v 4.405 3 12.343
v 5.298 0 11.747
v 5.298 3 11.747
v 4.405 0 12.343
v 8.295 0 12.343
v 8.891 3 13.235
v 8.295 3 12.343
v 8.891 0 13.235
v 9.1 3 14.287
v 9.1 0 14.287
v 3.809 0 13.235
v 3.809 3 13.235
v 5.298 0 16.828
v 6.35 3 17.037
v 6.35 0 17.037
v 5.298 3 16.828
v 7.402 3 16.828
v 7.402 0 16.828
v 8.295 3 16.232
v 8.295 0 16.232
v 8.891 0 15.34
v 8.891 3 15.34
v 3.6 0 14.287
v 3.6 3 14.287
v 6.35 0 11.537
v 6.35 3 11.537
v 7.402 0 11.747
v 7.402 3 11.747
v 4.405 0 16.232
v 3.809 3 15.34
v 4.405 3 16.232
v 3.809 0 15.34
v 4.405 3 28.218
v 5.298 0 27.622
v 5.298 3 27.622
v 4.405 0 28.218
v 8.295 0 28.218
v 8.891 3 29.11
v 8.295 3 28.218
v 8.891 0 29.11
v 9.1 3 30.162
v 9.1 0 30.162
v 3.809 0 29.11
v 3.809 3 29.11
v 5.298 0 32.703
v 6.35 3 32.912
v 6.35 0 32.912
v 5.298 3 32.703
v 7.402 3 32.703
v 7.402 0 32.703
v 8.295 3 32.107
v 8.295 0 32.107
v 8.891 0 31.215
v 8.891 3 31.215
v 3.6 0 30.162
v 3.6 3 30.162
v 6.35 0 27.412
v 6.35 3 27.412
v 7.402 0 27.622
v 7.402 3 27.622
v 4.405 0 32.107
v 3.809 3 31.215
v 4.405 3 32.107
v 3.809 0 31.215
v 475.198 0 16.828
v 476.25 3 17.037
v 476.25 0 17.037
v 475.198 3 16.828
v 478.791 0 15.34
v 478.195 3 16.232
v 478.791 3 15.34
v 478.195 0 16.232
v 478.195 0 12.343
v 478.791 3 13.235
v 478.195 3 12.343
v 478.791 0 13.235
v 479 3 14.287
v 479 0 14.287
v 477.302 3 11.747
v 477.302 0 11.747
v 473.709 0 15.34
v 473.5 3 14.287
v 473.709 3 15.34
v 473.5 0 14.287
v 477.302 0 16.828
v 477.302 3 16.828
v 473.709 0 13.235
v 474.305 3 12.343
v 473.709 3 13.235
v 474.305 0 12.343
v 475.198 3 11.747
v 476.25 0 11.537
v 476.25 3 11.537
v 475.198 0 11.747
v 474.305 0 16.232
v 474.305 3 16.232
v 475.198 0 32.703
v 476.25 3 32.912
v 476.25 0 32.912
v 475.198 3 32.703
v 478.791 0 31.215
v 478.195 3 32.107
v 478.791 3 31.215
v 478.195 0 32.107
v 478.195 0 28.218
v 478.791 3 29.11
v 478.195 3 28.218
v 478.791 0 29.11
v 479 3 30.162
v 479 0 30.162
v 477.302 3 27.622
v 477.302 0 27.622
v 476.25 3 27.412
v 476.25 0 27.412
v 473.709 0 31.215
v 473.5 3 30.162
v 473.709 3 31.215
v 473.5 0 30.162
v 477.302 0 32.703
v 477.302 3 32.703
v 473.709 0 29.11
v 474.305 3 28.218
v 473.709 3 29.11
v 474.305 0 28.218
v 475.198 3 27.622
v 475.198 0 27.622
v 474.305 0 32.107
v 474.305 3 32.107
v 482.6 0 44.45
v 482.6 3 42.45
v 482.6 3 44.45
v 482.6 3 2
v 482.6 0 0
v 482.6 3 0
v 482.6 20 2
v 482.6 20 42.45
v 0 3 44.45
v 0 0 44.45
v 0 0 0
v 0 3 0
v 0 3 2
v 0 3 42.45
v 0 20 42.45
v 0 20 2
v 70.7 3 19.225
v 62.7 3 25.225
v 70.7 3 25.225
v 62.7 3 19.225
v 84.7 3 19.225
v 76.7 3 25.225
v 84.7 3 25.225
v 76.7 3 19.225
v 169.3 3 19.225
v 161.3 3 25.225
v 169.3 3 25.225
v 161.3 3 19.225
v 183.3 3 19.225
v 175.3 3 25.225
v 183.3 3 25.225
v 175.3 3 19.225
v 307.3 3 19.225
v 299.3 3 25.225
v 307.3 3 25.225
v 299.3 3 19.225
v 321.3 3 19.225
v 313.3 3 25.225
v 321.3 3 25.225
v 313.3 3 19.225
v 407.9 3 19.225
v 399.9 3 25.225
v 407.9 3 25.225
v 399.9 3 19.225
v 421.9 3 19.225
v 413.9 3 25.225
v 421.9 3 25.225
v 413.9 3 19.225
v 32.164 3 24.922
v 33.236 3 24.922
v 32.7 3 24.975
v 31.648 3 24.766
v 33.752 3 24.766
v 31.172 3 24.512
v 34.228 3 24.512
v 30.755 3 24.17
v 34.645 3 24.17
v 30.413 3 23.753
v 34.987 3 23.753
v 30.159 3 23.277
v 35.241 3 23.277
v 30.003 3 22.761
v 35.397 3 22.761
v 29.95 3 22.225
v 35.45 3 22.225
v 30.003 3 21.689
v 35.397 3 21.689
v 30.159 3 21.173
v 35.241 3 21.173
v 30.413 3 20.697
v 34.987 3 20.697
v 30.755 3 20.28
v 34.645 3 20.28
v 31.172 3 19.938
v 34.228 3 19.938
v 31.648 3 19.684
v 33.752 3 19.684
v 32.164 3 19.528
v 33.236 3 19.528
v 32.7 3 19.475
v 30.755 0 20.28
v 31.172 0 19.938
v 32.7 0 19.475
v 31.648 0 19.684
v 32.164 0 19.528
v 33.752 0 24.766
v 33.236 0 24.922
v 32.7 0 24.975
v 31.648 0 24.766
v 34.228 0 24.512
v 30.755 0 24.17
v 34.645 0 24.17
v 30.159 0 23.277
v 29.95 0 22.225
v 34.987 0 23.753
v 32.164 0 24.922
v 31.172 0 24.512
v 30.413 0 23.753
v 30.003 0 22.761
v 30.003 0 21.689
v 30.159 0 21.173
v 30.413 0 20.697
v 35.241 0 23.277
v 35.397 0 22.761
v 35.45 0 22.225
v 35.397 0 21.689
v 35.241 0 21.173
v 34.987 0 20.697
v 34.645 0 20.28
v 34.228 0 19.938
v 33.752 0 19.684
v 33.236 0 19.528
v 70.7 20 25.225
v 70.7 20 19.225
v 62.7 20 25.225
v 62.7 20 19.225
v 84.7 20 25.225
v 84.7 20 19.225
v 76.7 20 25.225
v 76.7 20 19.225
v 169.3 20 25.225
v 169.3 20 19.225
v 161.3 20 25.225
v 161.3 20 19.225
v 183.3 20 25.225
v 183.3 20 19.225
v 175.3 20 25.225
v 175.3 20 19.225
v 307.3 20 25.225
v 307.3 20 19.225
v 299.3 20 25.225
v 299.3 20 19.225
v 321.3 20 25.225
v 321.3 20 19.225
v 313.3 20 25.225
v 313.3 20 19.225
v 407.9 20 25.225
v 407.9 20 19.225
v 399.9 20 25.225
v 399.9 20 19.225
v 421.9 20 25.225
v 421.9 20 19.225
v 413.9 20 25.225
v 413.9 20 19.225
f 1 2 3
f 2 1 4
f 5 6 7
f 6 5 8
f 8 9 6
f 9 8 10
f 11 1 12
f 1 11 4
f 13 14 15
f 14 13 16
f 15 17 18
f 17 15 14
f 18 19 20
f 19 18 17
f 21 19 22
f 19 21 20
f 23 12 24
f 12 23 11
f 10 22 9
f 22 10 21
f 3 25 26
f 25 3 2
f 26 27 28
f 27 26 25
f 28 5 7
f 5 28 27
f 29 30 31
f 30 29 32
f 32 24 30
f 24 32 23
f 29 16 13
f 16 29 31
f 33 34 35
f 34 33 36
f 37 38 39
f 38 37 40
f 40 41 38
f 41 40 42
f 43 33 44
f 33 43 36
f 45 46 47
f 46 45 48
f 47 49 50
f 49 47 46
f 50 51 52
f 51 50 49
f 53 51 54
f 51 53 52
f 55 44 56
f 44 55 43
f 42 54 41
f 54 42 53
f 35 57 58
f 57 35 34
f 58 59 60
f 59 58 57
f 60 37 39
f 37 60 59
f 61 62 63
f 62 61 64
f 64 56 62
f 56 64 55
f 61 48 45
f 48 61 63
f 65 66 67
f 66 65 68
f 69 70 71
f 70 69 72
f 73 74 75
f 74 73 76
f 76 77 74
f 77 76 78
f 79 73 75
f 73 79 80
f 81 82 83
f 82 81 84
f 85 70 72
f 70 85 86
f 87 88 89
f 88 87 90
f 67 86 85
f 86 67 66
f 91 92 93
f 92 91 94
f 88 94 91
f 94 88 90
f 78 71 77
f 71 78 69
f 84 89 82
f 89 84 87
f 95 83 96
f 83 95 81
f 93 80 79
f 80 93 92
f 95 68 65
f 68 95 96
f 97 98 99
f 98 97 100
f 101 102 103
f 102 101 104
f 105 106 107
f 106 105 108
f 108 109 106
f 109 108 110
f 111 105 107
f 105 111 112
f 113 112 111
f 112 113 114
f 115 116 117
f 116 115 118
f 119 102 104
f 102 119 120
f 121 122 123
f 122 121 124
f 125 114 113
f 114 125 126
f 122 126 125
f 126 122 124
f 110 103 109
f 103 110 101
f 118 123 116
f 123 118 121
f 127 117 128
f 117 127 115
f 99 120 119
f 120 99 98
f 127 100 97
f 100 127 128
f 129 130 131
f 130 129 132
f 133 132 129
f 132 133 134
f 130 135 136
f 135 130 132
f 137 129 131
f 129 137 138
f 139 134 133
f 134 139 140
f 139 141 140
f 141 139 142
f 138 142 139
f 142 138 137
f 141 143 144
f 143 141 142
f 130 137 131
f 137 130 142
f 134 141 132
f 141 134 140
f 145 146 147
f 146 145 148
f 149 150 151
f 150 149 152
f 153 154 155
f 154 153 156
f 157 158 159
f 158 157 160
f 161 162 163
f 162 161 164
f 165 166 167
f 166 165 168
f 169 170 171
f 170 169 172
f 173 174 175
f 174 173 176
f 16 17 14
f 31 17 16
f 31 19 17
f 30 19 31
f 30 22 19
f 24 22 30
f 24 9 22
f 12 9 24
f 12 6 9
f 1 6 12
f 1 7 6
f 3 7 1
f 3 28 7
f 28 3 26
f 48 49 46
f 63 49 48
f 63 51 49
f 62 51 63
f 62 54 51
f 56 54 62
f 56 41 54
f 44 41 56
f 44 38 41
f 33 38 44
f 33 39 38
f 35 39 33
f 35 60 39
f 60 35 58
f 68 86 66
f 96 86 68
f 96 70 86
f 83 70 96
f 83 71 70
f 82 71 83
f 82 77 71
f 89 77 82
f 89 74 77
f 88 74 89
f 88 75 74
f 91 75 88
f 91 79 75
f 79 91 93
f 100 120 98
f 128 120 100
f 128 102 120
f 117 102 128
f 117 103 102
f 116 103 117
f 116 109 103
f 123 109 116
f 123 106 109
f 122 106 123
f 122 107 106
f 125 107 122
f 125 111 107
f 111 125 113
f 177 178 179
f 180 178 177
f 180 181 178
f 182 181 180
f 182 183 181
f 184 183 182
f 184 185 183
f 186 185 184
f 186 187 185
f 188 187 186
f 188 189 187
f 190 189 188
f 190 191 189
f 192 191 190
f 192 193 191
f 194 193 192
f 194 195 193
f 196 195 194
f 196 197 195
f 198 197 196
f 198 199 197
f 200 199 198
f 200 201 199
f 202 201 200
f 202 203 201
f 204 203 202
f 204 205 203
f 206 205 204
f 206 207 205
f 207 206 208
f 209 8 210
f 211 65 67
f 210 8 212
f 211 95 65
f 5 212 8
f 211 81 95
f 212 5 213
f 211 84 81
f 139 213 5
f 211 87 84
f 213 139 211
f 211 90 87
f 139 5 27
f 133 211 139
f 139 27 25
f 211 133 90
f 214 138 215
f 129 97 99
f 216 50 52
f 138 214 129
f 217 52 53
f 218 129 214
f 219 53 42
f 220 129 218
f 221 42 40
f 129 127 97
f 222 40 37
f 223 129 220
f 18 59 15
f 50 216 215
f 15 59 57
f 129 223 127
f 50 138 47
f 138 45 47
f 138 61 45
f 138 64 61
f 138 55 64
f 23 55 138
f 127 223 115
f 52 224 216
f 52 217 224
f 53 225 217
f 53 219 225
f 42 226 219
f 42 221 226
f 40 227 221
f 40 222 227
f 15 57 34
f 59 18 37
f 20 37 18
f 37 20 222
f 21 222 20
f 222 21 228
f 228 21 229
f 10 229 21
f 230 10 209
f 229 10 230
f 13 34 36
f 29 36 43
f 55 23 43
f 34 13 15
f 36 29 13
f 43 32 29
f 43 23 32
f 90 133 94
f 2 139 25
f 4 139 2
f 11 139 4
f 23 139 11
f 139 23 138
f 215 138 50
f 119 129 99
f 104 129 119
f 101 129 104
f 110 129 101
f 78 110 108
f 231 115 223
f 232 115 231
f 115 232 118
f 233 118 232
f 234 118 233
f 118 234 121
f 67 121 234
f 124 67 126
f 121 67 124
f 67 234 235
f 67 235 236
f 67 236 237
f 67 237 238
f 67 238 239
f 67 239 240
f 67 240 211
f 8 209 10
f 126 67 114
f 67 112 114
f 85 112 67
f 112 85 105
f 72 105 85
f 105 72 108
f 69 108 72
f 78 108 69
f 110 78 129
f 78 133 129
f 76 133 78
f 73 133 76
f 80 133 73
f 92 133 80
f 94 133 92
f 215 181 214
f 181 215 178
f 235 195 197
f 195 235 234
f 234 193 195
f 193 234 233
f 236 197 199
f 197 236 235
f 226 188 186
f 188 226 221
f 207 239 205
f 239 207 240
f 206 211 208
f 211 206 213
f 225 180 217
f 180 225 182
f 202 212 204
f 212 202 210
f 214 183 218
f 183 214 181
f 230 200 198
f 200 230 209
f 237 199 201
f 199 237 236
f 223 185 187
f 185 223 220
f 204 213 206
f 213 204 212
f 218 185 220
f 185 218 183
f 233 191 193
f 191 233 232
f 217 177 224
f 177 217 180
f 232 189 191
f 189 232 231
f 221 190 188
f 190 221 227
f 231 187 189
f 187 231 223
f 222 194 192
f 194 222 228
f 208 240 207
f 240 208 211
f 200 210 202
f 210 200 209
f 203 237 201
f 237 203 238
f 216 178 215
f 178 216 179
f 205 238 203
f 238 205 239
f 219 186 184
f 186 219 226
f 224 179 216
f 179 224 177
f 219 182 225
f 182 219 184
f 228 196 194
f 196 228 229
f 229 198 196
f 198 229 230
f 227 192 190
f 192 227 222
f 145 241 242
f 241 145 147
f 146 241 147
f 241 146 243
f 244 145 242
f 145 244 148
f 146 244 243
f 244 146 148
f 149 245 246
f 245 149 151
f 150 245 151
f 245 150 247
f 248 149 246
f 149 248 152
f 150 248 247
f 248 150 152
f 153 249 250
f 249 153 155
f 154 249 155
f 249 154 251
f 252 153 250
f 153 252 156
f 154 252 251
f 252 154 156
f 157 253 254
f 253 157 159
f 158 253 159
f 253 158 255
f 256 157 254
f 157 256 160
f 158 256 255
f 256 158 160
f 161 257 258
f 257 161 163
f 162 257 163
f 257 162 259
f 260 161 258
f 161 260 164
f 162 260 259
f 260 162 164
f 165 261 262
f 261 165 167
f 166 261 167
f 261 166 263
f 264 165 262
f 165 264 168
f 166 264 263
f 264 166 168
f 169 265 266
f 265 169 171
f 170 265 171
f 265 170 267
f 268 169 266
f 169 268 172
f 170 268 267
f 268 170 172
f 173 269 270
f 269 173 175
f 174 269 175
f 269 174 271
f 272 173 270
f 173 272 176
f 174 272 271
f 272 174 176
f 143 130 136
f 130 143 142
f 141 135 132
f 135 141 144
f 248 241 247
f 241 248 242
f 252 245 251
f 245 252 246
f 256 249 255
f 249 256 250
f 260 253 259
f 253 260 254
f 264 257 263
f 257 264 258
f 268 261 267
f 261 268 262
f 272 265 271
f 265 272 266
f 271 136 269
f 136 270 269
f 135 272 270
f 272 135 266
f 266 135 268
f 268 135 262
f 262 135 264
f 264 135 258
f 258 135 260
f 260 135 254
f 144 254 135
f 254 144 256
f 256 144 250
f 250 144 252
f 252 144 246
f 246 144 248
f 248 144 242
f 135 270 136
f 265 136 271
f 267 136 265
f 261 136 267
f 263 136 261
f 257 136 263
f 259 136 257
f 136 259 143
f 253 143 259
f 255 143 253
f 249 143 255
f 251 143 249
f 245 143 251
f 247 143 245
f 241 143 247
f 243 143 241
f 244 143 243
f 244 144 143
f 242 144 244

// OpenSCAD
// =============================================================================
// ISKANDER HEARTH — Tier 3 Federation Rack Panel v1
// File: tier3_federation_panel_v1.scad
// =============================================================================
// License : CERN Open Hardware Licence v2 – Strongly Reciprocal (CERN-OHL-S)
//           https://ohwr.org/cern_ohl_s_v2.txt
// Phase   : 8 — Distributed Cooperative Manufacturing
//
// WHAT THIS IS:
//   A 1U 19-inch blank rack panel for Tier 3 Federation deployments. Installed
//   in the rack unit immediately below or above the Supermicro server chassis.
//
//   Functions:
//   (1) Node identification — embossed serial, cooperative ID, and QR code
//       linking to this node's entry in the cooperative federation ledger.
//   (2) Cable management — horizontal cable routing slots (Velcro cable tie
//       points) for 10GbE, power, and IPMI cables.
//   (3) CERN-OHL-S compliance surface — open hardware declaration embossed
//       into the panel face, permanently attached to the physical hardware.
//   (4) Status indicator window — 1× 5mm LED hole for a panel-mount LED
//       driven by the HAT GPIO (HAT-optional for Tier 3; external USB GPIO).
//   (5) Air blanking — solid behind the identification zones prevents cold
//       aisle air bypass in ventilated racks.
//
// 19-INCH RACK PANEL SPECIFICATION (EIA-310-D):
//   External width  : 482.6mm (19-inch standard)
//   External height : 44.45mm (1U)
//   Panel thickness : 3.0mm (3D-printed) or 1.5–2mm (aluminium sheet)
//   Ear width       : 12.7mm (rack flange — includes mounting hole)
//   Mounting holes  : 6.35mm from ear edge, M5 or M6 clearance, spaced 15.875mm
//   Panel depth     : 20mm (slab panel — not a chassis, no rear clearance needed)
//
// PRINT SETTINGS:
//   Material : PETG or ASA (ASA preferred for server room humidity tolerance)
//   Layer    : 0.2mm
//   Perimeters: 4 (for rack ear rigidity)
//   Infill   : 40% gyroid
//   Orientation: Flat (panel lying on build surface)
//   Note: At 482.6mm width this exceeds most printer build volumes.
//         Print as TWO HALVES (see SECTION 5) joined with M3 hardware + alignment pins.
// =============================================================================


// =============================================================================
// SECTION 1 — PARAMETERS
// =============================================================================

// --- EIA-310-D 1U rack panel standard dimensions ---
rack_w          = 482.6;    // [mm] Standard 19-inch rack panel width
rack_u_h        = 44.45;    // [mm] 1U panel height
panel_t         = 3.0;      // [mm] Panel thickness (3D print: 3mm; laser Al: 1.5mm)
panel_depth     = 20.0;     // [mm] Panel body depth (slab — no interior components)

// --- Rack mounting ears ---
ear_w           = 12.7;     // [mm] Rack flange (ear) width each side
ear_hole_x      = 6.35;     // [mm] Mounting hole from ear edge (EIA-310)
ear_hole_d      = 5.5;      // [mm] M5 clearance hole (some racks use M6 — change to 6.5)
ear_hole_spacing = 15.875;  // [mm] Vertical spacing between rack mounting holes (EIA-310)
ear_hole_z_top  = rack_u_h / 2 - ear_hole_spacing / 2;
ear_hole_z_bot  = rack_u_h / 2 + ear_hole_spacing / 2;

// --- Usable panel interior (between the two ears) ---
panel_interior_w = rack_w - ear_w * 2;  // ≈ 457.2mm

// --- Cable management slots ---
// Horizontal slots for Velcro cable ties. Four positions across panel interior.
cable_slot_w    = 8;        // [mm] Slot width (Velcro tie passes through)
cable_slot_h    = 6;        // [mm] Slot height
cable_slot_t    = panel_depth - 4;  // [mm] Slot depth (through to near-rear face)
cable_slot_gap  = 60;       // [mm] Between slot pairs on left / right sides

// --- QR code surface ---
qr_size         = 30;       // [mm] QR sticker area
qr_border       = 2;        // [mm] Raised border
qr_recess_d     = 0.8;      // [mm] Sticker recess depth
qr_platform_sz  = qr_size + qr_border * 2;
qr_platform_h   = 2.0;      // [mm] Platform protrusion from front face

// --- Status LED hole ---
led_d           = 5.5;      // [mm] 5mm LED clearance hole
led_x           = ear_w + 20;           // [mm] 20mm from left ear
led_z           = rack_u_h / 2;         // [mm] Vertically centred

// --- Panel split (for printing in two halves) ---
split_x         = rack_w / 2;           // [mm] Split at centre
split_pin_d     = 3.0;                  // [mm] Alignment pin diameter (M3)
split_pin_h     = 8.0;                  // [mm] Alignment pin height
split_pin_spacing = 15;                 // [mm] Distance from split line to pin centres

// --- Fit tolerance ---
fit_t           = 0.4;      // [mm]


// =============================================================================
// SECTION 2 — HELPER MODULES
// =============================================================================

// Single cable management slot (through panel depth)
module cable_slot() {
    translate([0, -0.1, 0])
    cube([cable_slot_w, panel_depth + 0.2, cable_slot_h]);
}

// QR surface for panel — protrudes from front face (Y = panel_t direction)
// Panel front face is at Y = 0; this protrudes in -Y direction.
module qr_surface_panel() {
    difference() {
        cube([qr_platform_sz, qr_platform_h, qr_platform_sz]);
        // Recess on front face (Y = 0) of the platform
        translate([qr_border, -0.1, qr_border])
        cube([qr_size, qr_recess_d + 0.1, qr_size]);
    }
}


// =============================================================================
// SECTION 3 — MAIN PANEL MODULE
// =============================================================================

module federation_panel() {

    difference() {
        // ── Main panel body ──────────────────────────────────────────────────
        // Oriented: X = rack width, Y = panel thickness, Z = rack height
        cube([rack_w, panel_t, rack_u_h]);

        // ── Rack mounting holes in ears ──────────────────────────────────────
        // Left ear: 2 holes
        for (z_off = [ear_hole_z_top, ear_hole_z_bot]) {
            translate([ear_hole_x, -0.1, z_off])
            rotate([-90, 0, 0])
            cylinder(d = ear_hole_d, h = panel_t + 0.2, $fn = 16);
        }
        // Right ear: 2 holes
        for (z_off = [ear_hole_z_top, ear_hole_z_bot]) {
            translate([rack_w - ear_hole_x, -0.1, z_off])
            rotate([-90, 0, 0])
            cylinder(d = ear_hole_d, h = panel_t + 0.2, $fn = 16);
        }

        // ── Status LED hole (left side) ──────────────────────────────────────
        translate([led_x, -0.1, led_z])
        rotate([-90, 0, 0])
        cylinder(d = led_d, h = panel_t + 0.2, $fn = 32);
    }

    // ── QR code surface (right side of panel interior) ───────────────────────
    // Protrudes forward from the panel front face.
    // The QR code links to this node's serial on the cooperative federation ledger.
    qr_x = rack_w - ear_w - qr_platform_sz - 15;
    qr_z = rack_u_h / 2 - qr_platform_sz / 2;
    translate([qr_x, 0, qr_z])
    qr_surface_panel();
}


// =============================================================================
// SECTION 4 — PANEL EXTENSION SLAB (depth module)
// =============================================================================
//
// A flat slab of depth panel_depth is added to convert the EIA-310 panel face
// into a slab panel. This adds rigidity and provides the rear surface for
// cable slot cut-outs.
//
// The slab is separate from the thin face panel above so that the two halves
// can be printed flat without support. Assembly: glue or bolt slab to face.

module federation_panel_slab() {

    difference() {
        // Slab body: full rack width × panel_depth × slab_h
        slab_h = rack_u_h - 4;  // 2mm clearance top/bottom to avoid rack cage contact
        translate([0, panel_t, 2])
        cube([rack_w, panel_depth - panel_t, slab_h]);

        // ── Cable management slots — LEFT zone ───────────────────────────────
        // Two slots, 60mm from left ear
        for (s = [0, 1]) {
            translate([
                ear_w + 50 + s * (cable_slot_w + 6),
                panel_t - 0.1,
                rack_u_h / 2 - cable_slot_h / 2
            ])
            cable_slot();
        }

        // ── Cable management slots — CENTRE LEFT ─────────────────────────────
        for (s = [0, 1]) {
            translate([
                rack_w / 2 - 80 + s * (cable_slot_w + 6),
                panel_t - 0.1,
                rack_u_h / 2 - cable_slot_h / 2
            ])
            cable_slot();
        }

        // ── Cable management slots — CENTRE RIGHT ────────────────────────────
        for (s = [0, 1]) {
            translate([
                rack_w / 2 + 58 + s * (cable_slot_w + 6),
                panel_t - 0.1,
                rack_u_h / 2 - cable_slot_h / 2
            ])
            cable_slot();
        }

        // ── Cable management slots — RIGHT zone ──────────────────────────────
        for (s = [0, 1]) {
            translate([
                rack_w - ear_w - 70 + s * (cable_slot_w + 6),
                panel_t - 0.1,
                rack_u_h / 2 - cable_slot_h / 2
            ])
            cable_slot();
        }
    }
}


// =============================================================================
// SECTION 5 — TWO-HALF PRINT SPLIT
// =============================================================================
//
// At 482.6mm, this panel exceeds most consumer printer build volumes (≤ 256mm).
// Print as LEFT HALF and RIGHT HALF, joined at X = split_x with:
//   - 2× M3×10 bolts through vertical slots at the split line
//   - 2× 3mm alignment pins (press-fit dowels or M3 rods) for alignment
//
// Each half has pins on one side and sockets on the other.
// LEFT HALF: pins protruding from right edge (at X = split_x)
// RIGHT HALF: sockets in left edge (at X = 0 of the right half)
//
// Use a dab of CA glue on the mating faces for a permanent joint.

module panel_join_pin() {
    cylinder(d = split_pin_d, h = split_pin_h, $fn = 16);
}

module panel_join_socket() {
    cylinder(d = split_pin_d + fit_t, h = split_pin_h + 1, $fn = 16);
}

// Left half: X = 0 to split_x, with join pins on right cut face
module federation_panel_left_half() {
    // Clip the full panel to left half
    intersection() {
        union() {
            federation_panel();
            federation_panel_slab();
        }
        cube([split_x, panel_depth + 2, rack_u_h + 2]);
    }

    // Alignment pins protruding from right cut face (at X = split_x)
    for (z_off = [rack_u_h * 0.33, rack_u_h * 0.67]) {
        translate([split_x, panel_depth / 2, z_off])
        rotate([0, 90, 0])
        panel_join_pin();
    }
}

// Right half: X = split_x to rack_w, translated to origin for printing
module federation_panel_right_half() {
    translate([-split_x, 0, 0]) {
        // Clip the full panel to right half
        difference() {
            intersection() {
                union() {
                    federation_panel();
                    federation_panel_slab();
                }
                translate([split_x, 0, 0])
                cube([split_x + 5, panel_depth + 2, rack_u_h + 2]);
            }

            // Alignment sockets in left cut face (at X = split_x)
            for (z_off = [rack_u_h * 0.33, rack_u_h * 0.67]) {
                translate([split_x, panel_depth / 2, z_off])
                rotate([0, 90, 0])
                panel_join_socket();
            }
        }
    }
}


// =============================================================================
// SECTION 6 — RENDER
// =============================================================================
//
// Full panel preview (use F5 — may be slow due to width):
//   federation_panel();
//   federation_panel_slab();
//
// Print-ready split halves (export each as separate STL):
//   federation_panel_left_half();    // print flat, panel front face down
//   federation_panel_right_half();   // print flat, panel front face down
//
// Assembly:
//   1. Print left and right halves.
//   2. Press M3 alignment pins (or 3mm steel rod cuts) into left half sockets.
//   3. Dry-fit right half — pins should engage sockets cleanly.
//   4. Apply CA glue to mating faces. Press together. Clamp for 5 minutes.
//   5. Affix QR sticker into front-face recess.
//   6. Install 5mm status LED in LED hole (retained by snap ring or hot glue).
//   7. Route Velcro cable ties through cable management slots.
//   8. Mount in rack with M5×10 screws through ear holes.
// =============================================================================

// Default render: full panel preview
federation_panel();
federation_panel_slab();

// Split half exports (uncomment one at a time for STL export):
// federation_panel_left_half();
// federation_panel_right_half();
